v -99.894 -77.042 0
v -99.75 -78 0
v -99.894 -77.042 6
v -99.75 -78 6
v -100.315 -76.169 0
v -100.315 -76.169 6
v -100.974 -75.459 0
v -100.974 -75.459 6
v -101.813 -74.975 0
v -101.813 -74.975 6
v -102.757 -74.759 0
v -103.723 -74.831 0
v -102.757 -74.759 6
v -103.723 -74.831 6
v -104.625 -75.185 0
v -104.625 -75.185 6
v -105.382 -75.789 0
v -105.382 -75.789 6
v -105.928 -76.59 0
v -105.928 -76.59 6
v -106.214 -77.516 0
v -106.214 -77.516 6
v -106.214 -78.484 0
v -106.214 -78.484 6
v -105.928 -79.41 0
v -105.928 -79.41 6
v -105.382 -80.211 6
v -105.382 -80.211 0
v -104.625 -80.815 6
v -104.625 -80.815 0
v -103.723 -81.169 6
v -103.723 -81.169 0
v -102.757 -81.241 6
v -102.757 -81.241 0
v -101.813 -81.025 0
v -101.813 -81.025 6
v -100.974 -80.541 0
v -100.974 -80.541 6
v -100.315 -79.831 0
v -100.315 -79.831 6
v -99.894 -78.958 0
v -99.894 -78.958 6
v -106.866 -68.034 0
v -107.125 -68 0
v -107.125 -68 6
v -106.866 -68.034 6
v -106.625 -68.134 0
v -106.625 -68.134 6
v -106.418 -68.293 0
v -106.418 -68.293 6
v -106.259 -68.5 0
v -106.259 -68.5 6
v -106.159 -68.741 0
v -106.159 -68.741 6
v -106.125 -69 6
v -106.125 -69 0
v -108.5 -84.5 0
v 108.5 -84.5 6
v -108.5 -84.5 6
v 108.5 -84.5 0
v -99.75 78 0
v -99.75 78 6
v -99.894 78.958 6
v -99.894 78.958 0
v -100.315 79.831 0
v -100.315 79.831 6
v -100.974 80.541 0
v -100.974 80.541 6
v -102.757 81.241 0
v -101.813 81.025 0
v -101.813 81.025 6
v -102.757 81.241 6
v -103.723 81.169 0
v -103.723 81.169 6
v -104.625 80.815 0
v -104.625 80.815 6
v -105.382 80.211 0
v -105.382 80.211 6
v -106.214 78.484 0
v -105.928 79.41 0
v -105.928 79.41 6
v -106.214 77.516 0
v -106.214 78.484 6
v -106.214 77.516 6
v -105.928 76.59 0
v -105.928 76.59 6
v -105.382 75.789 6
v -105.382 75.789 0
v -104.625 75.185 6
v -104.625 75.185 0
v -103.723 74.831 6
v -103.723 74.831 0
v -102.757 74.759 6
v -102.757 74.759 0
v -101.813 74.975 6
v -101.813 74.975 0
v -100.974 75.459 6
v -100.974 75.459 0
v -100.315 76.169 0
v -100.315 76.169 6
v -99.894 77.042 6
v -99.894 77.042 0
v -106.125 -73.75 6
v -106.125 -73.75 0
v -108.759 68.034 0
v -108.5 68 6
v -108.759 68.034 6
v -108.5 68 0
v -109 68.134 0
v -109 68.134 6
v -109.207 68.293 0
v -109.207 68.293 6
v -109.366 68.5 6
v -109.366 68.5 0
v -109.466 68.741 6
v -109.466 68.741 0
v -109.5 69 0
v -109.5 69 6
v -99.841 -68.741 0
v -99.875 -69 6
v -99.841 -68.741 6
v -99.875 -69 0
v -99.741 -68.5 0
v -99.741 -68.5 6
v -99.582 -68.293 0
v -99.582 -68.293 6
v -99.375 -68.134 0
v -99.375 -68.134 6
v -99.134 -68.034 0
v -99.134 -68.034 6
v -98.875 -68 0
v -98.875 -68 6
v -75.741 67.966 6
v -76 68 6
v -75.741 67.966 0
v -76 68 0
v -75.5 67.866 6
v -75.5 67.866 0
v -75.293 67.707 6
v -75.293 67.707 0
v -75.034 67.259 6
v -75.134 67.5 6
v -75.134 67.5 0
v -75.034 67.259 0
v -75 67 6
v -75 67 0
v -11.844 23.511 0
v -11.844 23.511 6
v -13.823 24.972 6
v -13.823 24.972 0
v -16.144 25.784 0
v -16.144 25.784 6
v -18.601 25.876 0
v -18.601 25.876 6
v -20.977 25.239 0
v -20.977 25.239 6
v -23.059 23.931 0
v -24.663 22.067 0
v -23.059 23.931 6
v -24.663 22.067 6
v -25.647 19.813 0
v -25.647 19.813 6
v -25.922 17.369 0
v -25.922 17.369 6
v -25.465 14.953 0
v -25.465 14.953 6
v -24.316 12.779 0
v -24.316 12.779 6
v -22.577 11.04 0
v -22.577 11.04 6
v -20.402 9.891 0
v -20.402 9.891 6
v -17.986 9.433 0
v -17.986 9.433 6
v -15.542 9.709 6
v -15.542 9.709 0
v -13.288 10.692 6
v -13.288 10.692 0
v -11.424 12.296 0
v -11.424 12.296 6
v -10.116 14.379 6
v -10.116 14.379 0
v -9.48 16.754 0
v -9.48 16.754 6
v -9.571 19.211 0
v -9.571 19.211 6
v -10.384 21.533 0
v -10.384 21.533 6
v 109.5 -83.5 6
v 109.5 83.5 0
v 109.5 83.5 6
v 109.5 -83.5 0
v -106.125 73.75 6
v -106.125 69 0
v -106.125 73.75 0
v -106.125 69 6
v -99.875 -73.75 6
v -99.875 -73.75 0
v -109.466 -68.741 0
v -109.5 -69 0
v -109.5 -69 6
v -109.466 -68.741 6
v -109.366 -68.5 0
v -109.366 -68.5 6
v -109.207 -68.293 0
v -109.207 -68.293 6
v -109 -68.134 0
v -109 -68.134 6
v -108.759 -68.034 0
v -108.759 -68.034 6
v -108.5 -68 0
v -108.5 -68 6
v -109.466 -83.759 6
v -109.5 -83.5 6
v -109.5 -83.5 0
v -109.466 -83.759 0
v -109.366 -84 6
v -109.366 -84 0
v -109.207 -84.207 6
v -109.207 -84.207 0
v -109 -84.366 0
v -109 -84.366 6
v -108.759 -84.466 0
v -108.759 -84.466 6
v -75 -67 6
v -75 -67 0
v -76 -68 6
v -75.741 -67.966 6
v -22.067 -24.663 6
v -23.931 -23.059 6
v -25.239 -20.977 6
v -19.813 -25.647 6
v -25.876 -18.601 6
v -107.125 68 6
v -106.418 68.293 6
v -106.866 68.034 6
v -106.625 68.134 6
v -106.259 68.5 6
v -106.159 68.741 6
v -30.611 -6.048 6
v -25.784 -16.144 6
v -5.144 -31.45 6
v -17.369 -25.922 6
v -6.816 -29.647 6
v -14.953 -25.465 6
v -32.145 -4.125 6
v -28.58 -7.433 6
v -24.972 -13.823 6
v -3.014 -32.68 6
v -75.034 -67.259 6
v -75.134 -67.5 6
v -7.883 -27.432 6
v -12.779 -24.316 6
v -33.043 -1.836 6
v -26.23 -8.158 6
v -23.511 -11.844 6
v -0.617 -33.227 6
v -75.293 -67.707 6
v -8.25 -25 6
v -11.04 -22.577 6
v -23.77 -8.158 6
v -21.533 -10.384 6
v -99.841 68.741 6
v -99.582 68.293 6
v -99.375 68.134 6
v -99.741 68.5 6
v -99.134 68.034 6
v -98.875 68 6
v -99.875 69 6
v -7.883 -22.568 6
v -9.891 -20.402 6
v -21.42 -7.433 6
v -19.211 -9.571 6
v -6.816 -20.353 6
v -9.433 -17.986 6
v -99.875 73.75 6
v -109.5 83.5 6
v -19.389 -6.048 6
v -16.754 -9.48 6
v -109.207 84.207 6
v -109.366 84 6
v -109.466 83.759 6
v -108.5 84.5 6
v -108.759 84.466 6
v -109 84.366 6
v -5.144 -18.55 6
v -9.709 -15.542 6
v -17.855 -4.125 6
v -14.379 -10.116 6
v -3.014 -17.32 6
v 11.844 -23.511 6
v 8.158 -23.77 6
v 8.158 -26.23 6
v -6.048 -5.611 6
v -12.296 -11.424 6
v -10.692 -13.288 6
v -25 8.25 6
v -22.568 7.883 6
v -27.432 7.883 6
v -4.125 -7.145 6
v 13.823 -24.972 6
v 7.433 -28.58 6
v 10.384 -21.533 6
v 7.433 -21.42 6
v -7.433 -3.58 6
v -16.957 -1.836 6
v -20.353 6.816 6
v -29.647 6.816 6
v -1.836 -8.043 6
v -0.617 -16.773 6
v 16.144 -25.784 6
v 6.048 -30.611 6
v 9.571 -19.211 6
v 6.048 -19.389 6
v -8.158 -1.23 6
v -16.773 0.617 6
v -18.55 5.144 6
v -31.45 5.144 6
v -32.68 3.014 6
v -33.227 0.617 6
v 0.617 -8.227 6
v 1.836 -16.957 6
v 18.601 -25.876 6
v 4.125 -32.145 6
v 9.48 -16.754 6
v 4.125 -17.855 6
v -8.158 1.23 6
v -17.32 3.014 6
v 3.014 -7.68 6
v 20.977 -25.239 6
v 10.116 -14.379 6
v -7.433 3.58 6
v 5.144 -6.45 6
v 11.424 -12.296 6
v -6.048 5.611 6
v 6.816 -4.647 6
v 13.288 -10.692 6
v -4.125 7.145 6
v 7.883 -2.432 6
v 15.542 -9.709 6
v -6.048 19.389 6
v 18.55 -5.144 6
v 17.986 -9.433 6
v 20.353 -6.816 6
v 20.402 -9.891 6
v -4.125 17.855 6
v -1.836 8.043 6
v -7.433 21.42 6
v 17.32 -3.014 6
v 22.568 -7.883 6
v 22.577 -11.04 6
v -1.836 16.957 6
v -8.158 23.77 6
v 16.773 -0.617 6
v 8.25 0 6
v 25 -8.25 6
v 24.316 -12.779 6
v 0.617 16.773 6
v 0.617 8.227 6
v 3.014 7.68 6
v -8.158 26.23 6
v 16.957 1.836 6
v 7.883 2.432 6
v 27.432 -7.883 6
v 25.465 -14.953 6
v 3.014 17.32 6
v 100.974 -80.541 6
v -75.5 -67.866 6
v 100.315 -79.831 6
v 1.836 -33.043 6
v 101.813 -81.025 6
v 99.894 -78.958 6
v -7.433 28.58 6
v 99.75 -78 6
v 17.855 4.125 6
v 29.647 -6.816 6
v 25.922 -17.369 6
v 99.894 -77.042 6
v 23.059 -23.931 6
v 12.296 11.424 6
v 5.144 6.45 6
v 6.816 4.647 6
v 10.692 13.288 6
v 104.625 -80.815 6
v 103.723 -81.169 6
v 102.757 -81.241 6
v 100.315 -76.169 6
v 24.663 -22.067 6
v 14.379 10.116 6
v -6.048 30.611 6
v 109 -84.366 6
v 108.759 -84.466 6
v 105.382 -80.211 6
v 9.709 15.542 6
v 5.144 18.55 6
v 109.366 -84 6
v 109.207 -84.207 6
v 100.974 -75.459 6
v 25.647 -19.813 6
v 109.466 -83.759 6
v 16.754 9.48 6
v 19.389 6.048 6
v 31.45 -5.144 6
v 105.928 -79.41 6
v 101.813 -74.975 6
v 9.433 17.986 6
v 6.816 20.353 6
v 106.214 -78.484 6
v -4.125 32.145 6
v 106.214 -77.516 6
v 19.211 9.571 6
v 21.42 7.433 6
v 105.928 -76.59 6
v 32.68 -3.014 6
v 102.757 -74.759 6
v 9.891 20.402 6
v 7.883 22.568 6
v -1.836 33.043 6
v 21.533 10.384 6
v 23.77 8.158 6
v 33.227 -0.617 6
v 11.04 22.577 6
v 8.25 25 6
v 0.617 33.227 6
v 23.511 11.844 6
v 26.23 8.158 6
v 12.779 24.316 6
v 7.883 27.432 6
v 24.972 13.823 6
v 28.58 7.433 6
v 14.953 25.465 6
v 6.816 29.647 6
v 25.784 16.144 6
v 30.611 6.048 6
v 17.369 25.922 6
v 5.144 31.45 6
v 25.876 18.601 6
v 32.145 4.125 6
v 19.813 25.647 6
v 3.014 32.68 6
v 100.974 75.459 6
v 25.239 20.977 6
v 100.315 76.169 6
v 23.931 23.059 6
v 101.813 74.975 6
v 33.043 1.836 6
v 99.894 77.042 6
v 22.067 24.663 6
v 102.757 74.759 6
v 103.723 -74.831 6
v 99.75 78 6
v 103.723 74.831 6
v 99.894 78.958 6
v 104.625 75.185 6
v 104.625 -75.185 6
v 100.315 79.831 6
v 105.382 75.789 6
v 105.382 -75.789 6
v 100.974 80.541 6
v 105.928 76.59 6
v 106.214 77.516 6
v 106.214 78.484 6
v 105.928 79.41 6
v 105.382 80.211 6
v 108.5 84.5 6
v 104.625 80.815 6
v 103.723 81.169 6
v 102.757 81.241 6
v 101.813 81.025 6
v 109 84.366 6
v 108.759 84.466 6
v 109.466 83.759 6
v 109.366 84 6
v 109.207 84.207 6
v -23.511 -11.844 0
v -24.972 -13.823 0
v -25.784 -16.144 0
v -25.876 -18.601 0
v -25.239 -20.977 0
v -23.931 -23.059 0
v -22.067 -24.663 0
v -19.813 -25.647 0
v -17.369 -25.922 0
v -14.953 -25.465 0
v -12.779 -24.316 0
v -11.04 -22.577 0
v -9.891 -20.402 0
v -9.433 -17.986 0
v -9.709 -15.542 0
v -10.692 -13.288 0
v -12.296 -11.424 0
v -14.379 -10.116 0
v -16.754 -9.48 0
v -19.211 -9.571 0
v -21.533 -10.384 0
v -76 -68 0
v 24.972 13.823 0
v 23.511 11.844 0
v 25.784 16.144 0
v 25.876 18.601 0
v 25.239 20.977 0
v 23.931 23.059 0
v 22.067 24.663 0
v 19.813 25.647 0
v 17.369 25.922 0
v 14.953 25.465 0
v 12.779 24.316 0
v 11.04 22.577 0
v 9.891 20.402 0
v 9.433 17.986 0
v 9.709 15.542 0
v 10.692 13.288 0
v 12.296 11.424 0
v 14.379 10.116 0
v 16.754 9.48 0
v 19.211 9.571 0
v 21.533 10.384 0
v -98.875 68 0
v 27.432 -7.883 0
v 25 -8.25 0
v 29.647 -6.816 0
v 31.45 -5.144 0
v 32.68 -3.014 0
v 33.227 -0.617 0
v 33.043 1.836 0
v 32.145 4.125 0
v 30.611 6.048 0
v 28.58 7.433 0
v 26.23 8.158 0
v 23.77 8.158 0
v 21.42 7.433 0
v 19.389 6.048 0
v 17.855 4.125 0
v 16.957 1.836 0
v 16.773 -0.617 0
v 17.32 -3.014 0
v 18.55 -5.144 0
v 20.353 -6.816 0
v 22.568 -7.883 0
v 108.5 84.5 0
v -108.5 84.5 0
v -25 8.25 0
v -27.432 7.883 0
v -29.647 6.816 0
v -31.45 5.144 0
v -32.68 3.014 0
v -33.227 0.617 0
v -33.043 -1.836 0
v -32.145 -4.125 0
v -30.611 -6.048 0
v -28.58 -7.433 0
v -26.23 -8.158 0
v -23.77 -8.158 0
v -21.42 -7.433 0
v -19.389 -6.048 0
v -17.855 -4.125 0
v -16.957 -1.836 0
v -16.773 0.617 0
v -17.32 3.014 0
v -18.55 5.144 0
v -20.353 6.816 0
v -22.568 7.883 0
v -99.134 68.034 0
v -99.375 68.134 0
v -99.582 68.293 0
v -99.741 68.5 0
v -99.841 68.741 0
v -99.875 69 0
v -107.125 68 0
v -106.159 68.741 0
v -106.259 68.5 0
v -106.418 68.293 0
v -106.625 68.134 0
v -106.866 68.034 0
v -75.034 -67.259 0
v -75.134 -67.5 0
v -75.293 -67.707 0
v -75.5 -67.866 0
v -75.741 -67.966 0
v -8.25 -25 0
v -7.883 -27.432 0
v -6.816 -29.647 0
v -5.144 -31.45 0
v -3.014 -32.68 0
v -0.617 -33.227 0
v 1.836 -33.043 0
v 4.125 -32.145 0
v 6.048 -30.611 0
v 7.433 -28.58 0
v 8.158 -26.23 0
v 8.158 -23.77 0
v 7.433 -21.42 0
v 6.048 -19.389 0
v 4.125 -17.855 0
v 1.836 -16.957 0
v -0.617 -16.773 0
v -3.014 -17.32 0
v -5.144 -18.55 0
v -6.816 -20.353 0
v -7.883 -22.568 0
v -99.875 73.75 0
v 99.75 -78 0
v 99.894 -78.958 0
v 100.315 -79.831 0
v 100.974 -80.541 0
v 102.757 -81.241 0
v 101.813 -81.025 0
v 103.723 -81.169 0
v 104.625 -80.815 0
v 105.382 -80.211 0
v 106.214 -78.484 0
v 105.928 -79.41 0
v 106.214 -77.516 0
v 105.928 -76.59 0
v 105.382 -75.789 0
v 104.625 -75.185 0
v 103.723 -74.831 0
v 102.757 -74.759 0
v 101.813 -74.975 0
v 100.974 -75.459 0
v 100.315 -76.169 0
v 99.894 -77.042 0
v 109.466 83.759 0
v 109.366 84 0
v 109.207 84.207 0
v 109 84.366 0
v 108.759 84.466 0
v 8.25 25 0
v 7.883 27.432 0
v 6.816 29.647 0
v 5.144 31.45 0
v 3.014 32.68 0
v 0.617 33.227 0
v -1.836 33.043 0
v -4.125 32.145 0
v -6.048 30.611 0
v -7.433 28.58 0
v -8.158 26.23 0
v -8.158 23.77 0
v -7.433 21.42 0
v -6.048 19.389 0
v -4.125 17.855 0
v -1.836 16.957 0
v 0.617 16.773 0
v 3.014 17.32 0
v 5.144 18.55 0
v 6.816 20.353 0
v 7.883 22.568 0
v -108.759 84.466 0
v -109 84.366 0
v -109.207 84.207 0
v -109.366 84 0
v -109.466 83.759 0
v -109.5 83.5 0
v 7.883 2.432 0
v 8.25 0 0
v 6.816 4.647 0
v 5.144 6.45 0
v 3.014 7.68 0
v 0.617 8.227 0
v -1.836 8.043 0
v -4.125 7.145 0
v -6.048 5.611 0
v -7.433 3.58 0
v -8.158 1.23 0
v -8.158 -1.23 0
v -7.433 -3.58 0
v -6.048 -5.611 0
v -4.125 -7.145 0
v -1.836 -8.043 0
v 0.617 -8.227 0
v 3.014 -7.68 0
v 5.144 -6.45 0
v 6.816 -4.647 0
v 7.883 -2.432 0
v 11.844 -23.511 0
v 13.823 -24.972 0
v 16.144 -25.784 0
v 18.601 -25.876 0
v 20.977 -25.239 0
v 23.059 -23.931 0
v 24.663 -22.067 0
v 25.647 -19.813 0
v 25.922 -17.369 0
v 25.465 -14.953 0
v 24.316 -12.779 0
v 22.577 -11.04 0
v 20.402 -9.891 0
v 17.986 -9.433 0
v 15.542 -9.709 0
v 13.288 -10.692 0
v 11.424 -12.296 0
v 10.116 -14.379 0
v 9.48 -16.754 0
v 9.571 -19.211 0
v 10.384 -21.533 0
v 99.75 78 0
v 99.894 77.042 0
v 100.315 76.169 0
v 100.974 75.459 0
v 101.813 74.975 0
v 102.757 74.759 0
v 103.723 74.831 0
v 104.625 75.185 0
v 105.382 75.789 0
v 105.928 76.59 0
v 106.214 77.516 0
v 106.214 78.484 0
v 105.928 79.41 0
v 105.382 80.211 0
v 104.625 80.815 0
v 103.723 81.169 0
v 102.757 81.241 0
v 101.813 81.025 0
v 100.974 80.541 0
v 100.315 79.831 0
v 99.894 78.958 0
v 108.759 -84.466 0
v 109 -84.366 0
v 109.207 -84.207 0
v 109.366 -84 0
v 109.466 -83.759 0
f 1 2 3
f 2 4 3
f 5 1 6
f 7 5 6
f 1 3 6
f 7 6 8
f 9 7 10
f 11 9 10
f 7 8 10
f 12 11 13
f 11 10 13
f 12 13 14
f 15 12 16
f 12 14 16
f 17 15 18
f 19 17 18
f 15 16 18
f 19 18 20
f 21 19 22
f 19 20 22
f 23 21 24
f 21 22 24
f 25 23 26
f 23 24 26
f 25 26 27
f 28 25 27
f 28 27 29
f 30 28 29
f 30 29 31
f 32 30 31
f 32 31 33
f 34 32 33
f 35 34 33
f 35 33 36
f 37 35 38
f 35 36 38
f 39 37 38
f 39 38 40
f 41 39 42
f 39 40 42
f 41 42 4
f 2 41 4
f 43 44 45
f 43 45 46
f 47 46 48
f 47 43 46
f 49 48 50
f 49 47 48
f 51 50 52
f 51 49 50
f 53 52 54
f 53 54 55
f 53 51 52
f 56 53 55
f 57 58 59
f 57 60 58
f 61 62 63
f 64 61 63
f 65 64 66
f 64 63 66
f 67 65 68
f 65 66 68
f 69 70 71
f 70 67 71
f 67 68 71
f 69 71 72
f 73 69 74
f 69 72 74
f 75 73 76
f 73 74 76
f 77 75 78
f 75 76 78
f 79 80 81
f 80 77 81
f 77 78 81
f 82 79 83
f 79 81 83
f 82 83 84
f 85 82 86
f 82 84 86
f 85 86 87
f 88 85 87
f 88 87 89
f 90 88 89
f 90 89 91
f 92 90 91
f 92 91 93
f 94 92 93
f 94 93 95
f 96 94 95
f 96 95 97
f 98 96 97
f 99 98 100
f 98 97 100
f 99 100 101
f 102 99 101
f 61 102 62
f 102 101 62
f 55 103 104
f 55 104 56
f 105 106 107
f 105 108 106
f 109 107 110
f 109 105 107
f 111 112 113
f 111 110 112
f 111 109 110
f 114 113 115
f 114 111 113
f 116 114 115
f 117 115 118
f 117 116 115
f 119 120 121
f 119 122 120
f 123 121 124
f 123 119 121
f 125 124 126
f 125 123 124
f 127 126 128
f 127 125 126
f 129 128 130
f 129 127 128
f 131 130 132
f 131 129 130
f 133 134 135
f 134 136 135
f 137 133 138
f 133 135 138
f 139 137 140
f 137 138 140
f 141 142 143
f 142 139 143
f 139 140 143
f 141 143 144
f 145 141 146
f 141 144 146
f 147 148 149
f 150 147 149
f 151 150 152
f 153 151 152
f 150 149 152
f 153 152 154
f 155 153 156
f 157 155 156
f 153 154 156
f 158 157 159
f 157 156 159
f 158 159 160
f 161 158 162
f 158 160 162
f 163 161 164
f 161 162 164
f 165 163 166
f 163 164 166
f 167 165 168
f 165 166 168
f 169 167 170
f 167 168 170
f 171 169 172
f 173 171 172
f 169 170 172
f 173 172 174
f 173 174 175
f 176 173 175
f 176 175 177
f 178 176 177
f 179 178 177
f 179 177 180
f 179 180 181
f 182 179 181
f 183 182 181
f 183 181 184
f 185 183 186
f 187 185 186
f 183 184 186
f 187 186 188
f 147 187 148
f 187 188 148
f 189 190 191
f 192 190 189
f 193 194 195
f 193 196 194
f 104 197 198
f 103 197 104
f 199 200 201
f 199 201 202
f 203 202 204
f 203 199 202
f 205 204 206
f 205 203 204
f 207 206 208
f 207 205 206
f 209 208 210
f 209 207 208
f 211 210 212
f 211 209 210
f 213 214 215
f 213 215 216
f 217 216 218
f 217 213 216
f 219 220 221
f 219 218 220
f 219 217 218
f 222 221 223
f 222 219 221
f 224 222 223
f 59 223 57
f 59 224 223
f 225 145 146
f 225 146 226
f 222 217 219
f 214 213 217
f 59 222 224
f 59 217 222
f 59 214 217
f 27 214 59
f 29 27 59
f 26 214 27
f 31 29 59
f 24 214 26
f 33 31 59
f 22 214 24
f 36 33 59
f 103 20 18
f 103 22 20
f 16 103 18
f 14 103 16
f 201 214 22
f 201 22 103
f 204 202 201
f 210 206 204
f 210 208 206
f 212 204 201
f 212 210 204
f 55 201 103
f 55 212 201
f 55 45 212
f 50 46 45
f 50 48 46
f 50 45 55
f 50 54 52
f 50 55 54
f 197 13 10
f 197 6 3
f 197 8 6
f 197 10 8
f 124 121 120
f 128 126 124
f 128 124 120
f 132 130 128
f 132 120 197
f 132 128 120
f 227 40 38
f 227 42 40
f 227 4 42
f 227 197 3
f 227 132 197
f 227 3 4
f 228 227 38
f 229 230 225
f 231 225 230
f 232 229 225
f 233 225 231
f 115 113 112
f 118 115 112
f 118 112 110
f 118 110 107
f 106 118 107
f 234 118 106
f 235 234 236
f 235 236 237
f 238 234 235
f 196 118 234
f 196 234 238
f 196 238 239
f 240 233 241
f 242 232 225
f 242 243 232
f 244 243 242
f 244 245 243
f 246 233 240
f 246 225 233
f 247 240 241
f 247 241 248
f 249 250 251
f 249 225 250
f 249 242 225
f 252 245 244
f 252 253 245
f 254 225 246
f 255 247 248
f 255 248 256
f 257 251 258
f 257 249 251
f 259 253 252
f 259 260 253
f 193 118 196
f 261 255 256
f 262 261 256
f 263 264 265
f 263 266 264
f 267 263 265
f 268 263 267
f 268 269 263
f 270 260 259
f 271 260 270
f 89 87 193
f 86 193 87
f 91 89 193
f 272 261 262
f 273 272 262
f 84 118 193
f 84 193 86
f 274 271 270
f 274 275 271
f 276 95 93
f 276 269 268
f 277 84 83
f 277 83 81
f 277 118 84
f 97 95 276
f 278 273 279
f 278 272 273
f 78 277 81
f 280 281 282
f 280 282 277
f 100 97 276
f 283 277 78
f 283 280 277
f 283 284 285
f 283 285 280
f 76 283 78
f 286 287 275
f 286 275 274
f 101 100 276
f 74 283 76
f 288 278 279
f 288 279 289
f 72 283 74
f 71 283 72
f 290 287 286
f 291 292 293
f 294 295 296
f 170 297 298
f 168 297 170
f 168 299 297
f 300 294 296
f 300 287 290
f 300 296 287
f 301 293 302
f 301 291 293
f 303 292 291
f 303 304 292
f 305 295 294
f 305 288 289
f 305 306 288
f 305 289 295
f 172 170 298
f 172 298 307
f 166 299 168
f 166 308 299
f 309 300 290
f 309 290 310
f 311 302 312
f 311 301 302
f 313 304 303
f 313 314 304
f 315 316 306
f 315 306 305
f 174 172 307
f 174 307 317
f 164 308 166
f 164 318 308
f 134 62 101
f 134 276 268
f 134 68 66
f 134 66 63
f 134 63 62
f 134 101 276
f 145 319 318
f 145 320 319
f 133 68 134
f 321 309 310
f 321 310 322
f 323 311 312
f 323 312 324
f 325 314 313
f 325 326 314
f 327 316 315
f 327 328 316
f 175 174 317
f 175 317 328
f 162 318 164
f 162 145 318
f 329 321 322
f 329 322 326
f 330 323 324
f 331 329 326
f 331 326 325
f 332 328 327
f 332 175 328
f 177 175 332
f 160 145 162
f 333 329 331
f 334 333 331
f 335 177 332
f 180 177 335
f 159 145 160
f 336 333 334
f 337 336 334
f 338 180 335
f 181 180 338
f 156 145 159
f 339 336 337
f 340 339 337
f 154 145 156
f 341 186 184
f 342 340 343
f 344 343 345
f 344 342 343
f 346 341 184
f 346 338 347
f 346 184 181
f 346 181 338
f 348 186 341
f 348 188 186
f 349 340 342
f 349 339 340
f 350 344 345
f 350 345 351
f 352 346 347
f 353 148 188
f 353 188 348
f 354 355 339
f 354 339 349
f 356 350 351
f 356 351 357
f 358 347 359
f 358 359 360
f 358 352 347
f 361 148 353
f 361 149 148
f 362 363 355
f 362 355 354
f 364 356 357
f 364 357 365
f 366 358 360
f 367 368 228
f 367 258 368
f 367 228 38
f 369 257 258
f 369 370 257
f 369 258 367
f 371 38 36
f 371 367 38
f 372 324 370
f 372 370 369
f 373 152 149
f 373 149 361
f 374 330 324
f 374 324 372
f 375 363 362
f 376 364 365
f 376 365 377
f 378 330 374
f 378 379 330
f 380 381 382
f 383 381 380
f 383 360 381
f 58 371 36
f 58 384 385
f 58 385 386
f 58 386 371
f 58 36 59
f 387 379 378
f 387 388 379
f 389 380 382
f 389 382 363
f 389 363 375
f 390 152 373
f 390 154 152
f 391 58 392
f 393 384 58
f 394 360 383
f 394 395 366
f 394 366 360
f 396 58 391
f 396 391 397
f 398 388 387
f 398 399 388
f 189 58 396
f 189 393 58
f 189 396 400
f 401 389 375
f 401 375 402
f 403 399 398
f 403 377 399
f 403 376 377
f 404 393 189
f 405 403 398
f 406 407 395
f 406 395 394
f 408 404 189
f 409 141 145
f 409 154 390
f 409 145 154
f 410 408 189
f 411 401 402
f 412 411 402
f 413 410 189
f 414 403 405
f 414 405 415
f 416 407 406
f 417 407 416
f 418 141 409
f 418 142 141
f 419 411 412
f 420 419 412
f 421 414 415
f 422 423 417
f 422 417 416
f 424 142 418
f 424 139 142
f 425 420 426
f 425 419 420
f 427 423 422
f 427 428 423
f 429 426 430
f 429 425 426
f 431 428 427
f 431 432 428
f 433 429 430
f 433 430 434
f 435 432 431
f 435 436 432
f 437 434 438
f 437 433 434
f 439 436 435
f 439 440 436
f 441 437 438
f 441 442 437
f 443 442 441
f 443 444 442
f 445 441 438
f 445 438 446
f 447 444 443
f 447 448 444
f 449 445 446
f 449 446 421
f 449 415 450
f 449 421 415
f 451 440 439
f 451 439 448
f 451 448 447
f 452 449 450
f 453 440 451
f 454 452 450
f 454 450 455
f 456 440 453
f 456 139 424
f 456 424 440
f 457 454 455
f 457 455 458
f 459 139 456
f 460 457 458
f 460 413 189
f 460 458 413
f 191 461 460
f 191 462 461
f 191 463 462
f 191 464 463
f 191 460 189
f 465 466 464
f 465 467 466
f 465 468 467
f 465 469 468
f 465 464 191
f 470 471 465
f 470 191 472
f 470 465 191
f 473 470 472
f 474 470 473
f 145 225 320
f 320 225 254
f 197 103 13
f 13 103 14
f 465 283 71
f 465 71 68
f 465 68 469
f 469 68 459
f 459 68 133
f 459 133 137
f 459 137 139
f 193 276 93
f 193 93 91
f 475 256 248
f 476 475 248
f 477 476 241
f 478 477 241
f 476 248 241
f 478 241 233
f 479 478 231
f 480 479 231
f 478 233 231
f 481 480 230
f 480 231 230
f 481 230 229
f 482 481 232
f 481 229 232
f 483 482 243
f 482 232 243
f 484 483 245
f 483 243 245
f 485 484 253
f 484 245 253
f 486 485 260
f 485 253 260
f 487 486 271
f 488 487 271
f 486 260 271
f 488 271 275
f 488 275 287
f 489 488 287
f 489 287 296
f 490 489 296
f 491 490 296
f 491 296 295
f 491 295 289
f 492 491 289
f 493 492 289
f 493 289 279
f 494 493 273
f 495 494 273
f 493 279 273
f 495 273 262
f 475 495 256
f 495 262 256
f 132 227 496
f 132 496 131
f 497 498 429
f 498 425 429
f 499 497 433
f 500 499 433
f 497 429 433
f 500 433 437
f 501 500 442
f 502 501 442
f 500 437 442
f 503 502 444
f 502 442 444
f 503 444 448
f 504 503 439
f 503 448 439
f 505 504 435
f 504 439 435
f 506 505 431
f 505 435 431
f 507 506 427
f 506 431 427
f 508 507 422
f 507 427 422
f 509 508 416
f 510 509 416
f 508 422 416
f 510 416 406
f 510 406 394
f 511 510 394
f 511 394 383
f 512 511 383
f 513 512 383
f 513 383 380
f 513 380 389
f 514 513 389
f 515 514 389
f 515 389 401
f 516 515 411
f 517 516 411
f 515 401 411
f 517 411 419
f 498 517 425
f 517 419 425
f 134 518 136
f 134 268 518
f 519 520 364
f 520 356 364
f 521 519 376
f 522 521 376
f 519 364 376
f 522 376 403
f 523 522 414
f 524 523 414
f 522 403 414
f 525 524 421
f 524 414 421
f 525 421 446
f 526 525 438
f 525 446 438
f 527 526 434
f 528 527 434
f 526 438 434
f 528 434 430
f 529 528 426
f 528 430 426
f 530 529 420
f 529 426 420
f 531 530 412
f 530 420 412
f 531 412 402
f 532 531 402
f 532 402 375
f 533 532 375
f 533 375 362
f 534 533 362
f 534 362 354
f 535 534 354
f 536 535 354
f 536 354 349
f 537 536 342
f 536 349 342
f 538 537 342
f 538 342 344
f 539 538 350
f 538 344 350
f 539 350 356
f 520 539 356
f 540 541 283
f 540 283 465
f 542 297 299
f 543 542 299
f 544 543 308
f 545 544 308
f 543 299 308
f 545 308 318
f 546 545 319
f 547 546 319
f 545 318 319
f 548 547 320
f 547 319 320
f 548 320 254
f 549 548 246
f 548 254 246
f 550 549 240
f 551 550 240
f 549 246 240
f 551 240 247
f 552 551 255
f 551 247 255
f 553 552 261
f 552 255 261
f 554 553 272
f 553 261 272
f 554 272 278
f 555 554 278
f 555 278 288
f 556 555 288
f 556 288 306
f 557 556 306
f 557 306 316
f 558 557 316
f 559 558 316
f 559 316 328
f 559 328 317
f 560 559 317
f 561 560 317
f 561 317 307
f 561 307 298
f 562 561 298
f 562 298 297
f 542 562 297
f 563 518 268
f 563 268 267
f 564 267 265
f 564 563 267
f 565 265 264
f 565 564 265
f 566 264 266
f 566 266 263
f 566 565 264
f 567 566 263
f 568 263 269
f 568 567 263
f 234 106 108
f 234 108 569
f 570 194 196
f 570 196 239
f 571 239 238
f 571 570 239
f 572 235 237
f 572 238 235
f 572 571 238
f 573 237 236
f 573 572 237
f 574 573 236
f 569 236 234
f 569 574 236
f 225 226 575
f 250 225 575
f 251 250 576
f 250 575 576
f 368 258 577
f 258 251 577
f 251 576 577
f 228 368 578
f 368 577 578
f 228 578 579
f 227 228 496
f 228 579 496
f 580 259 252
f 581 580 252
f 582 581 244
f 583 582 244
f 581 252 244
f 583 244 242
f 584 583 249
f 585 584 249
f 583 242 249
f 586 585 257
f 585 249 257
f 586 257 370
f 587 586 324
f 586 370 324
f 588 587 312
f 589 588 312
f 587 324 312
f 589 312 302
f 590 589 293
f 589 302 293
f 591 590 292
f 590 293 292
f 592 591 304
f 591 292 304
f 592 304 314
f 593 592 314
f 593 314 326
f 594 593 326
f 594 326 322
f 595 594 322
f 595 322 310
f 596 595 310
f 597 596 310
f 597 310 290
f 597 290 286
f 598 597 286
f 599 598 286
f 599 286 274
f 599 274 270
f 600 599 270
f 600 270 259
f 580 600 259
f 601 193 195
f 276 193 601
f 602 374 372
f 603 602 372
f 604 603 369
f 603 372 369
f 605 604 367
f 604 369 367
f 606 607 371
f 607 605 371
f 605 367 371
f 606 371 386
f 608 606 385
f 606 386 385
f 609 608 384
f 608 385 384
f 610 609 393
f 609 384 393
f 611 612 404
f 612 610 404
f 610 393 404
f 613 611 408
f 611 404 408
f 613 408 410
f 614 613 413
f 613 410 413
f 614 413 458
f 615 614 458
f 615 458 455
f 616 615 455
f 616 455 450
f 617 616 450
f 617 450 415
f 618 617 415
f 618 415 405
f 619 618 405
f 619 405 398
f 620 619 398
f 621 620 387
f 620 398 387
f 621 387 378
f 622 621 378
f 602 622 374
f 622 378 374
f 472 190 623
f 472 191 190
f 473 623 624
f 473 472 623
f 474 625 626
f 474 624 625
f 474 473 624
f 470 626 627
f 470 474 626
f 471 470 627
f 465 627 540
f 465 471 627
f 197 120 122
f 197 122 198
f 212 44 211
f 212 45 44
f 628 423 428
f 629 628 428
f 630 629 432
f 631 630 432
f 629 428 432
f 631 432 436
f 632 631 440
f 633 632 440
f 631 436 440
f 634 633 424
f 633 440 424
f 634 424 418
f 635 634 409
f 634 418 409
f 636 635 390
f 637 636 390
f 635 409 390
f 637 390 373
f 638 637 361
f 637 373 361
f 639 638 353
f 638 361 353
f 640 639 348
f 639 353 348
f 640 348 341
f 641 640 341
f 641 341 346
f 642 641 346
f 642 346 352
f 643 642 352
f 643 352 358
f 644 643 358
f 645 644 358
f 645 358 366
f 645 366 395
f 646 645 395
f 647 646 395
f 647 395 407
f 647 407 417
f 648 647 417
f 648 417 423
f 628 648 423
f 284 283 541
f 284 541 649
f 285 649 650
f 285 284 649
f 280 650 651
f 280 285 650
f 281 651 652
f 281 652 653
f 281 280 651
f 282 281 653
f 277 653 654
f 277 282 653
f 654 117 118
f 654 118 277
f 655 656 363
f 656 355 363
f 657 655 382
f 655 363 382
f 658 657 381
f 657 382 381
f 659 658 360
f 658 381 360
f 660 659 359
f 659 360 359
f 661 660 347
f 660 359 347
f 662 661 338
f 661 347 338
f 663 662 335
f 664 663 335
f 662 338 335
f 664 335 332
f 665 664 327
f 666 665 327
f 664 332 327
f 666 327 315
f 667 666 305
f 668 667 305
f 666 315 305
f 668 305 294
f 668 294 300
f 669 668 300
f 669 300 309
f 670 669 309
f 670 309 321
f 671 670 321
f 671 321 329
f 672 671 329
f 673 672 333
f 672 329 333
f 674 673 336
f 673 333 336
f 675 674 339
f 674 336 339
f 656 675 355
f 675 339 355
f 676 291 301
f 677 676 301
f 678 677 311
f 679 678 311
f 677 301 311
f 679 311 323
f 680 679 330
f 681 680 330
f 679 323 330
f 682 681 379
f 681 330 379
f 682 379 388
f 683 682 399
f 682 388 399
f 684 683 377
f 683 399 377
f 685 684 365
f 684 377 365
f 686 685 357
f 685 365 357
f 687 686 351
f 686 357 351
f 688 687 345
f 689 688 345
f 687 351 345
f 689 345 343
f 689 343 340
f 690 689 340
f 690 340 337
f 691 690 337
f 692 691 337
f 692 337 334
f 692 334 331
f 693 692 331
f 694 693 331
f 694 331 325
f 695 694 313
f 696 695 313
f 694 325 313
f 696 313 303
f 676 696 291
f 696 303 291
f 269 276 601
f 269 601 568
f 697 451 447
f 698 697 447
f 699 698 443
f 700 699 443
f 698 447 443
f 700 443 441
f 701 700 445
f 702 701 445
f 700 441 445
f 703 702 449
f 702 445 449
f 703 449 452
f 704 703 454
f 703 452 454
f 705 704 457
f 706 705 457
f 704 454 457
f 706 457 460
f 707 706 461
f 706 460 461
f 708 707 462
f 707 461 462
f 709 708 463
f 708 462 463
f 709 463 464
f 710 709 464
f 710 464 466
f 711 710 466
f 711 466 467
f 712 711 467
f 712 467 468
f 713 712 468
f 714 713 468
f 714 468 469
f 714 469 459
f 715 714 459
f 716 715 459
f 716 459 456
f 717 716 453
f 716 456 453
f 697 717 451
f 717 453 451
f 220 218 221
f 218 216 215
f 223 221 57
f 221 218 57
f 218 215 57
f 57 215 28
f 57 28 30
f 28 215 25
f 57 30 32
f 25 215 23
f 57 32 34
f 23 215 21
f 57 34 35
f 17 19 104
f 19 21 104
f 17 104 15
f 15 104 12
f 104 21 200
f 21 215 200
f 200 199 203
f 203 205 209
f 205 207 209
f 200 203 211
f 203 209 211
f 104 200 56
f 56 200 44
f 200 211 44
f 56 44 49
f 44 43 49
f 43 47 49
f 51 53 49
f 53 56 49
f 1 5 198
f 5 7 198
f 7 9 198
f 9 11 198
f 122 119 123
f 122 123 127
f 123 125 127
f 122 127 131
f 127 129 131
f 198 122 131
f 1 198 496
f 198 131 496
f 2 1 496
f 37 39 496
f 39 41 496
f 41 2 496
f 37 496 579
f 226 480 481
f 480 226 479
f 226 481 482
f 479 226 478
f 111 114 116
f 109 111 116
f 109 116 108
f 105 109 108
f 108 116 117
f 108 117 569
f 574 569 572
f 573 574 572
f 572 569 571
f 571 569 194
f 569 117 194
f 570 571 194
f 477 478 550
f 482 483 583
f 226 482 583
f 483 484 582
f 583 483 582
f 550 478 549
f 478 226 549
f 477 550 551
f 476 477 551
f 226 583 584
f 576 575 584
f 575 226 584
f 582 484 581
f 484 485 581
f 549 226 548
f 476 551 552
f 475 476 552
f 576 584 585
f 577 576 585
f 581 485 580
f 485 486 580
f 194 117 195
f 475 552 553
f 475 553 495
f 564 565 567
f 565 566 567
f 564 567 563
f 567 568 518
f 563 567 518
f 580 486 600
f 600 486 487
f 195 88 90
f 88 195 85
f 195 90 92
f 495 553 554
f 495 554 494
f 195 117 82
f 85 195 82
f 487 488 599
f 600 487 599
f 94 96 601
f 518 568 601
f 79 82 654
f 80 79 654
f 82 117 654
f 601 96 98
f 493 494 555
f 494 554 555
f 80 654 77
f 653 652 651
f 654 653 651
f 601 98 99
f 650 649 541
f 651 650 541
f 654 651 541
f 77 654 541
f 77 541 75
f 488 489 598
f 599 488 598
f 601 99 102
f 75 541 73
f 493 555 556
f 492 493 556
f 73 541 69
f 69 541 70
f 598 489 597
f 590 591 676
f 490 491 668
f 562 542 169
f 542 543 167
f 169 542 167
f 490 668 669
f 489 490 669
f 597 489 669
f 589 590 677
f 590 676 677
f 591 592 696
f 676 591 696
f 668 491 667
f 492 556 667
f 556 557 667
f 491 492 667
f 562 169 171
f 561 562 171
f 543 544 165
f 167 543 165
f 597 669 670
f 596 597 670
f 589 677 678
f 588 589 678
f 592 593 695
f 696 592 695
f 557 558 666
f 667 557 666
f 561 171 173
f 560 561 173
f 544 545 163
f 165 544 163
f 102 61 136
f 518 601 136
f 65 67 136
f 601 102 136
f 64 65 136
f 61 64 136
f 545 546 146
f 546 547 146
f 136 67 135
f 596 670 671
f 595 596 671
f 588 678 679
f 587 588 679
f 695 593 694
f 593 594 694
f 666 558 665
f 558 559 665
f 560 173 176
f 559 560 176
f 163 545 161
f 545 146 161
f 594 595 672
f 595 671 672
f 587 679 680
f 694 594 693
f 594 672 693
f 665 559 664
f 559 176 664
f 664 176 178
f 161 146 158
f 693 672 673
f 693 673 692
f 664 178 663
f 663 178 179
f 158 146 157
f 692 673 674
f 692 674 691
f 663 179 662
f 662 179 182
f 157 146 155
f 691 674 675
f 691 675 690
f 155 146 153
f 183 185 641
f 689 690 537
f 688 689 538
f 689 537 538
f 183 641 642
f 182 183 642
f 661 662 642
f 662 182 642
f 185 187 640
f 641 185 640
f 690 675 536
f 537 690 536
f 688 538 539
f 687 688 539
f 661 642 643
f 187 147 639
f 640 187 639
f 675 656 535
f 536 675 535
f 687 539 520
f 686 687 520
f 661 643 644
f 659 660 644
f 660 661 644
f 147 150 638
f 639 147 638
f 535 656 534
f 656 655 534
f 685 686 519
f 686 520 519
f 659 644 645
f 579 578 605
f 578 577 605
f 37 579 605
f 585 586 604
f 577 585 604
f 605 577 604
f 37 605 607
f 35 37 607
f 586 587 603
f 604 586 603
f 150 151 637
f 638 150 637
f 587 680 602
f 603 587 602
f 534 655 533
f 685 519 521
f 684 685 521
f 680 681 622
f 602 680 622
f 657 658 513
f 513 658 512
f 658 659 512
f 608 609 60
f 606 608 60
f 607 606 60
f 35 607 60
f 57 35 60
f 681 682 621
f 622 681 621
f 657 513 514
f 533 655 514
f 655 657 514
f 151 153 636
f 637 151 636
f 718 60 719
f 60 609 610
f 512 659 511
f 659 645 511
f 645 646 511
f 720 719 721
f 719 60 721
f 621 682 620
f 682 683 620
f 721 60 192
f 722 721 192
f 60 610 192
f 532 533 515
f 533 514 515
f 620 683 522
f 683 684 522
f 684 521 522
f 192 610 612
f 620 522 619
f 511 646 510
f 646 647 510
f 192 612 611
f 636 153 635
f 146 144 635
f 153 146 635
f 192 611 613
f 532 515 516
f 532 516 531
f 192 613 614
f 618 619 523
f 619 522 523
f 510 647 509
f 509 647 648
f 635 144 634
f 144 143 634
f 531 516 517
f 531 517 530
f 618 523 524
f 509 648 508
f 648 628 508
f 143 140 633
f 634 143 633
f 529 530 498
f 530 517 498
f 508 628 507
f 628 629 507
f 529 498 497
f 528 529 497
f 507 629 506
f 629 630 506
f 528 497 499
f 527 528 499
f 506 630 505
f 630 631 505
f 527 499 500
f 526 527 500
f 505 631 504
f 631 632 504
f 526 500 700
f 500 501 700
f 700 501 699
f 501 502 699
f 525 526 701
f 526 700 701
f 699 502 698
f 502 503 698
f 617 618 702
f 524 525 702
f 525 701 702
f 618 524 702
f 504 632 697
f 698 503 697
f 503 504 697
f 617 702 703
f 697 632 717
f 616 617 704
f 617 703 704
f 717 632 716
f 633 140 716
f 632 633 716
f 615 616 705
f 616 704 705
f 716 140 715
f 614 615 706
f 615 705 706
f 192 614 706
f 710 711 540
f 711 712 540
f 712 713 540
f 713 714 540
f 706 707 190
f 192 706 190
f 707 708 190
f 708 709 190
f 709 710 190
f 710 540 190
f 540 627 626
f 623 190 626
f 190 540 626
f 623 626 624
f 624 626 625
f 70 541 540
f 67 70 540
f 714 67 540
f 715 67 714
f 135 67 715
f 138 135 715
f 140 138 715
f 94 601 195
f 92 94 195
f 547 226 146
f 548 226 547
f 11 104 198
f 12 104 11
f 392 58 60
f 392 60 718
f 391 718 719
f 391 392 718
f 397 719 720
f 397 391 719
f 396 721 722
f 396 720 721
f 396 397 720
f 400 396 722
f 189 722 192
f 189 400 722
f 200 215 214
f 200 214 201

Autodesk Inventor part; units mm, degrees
sketch "Sketch1" plane through (0, 0, 0) normal (0, 0, 1) x (1, 0, 0)
  line L0 (-109.5, 84.5) -> (109.5, 84.5)
  line L1 (109.5, 84.5) -> (109.5, -84.5)
  line L2 (109.5, -84.5) -> (-109.5, -84.5)
  line L3 (-109.5, -84.5) -> (-109.5, 84.5)
  point P0 (0, 84.5)
  point P1 (0, 0)
  point P2 (-109.5, 0)
  dimension "d0" = 219
  dimension "d1" = 169
extrude "Extrusion1" add sketch "Sketch1" along normal blind 6
sketch "Sketch2" plane through (0, 0, 6) normal (0, 0, 1) x (1, 0, 0)
  circle A0 centre (-103, -78) radius 3.25
  line L0 (-103, -78) -> (-103, -74) construction
  line L1 (-106.25, -68) -> (-99.75, -68)
  line L2 (-99.75, -68) -> (-99.75, -74)
  line L3 (-99.75, -74) -> (-106.25, -74)
  line L4 (-106.25, -74) -> (-106.25, -68)
  line L5 (-109.5, -84.5) -> (109.5, -84.5) projected
  line L6 (-109.5, -84.5) -> (-103, -84.5) construction
  line L7 (-103, -84.5) -> (-103, -78) construction
  point P0 (0, 0)
  dimension "d39" = 6.5
  dimension "d44" = 4
  dimension "d45" = 6.5
  dimension "d46" = 6
  dimension "d64" = 6.5
  dimension "d65" = 6.5
extrude "Extrusion2" cut sketch "Sketch2" against normal blind 6 contours A0
mirror "Mirror3" about plane through (0, 0, 0) normal (1, 0, 0) of "Extrusion2"
mirror "Mirror7" about plane through (0, 0, 0) normal (0, 1, 0) of "Extrusion2", "Mirror3"
sketch "Sketch7" plane through (0, 0, 6) normal (0, 0, 1) x (1, 0, 0)
  line L0 (-109.5, 84.5) -> (-109.5, -84.5) projected
  line L1 (-109.5, 68) -> (-75, 68)
  line L2 (-75, 68) -> (-75, -68)
  line L3 (-75, -68) -> (-109.5, -68)
  line L4 (-109.5, -68) -> (-109.5, 68)
  point P0 (0, 0)
  point P1 (-109.5, 0)
  point P2 (-109.5, 0)
  dimension "d40" = 34.5
  dimension "d41" = 136
extrude "Extrusion6" cut sketch "Sketch7" against normal blind 10
sketch "Sketch8" plane through (0, 0, 6) normal (0, 0, 1) x (1, 0, 0)
  circle A0 centre (-103, -78) radius 3.25 projected
  line L0 (-103, -78) -> (-103, -73.75) construction
  line L1 (-106.125, -68) -> (-99.875, -68)
  line L2 (-99.875, -68) -> (-99.875, -73.75)
  line L3 (-99.875, -73.75) -> (-106.125, -73.75)
  line L4 (-106.125, -73.75) -> (-106.125, -68)
  point P0 (0, 0)
  dimension "d47" = 4.25
  dimension "d48" = 6.25
  dimension "d49" = 5.75
extrude "Extrusion7" cut sketch "Sketch8" against normal blind 6 contours L1 L2 L3 L4
mirror "Mirror8" about plane through (0, 0, 0) normal (0, 1, 0) of "Extrusion7"
fillet "Fillet5" radius 1 12 edges at (-109.5, -84.5, 3) (109.5, -84.5, 3) (-75, -68, 3) (109.5, 84.5, 3) (-109.5, 84.5, 3) (-109.5, 68, 3) (-75, 68, 3) (-99.875, 68, 3) (-106.125, 68, 3) (-99.875, -68, 3) (-109.5, -68, 3) (-106.125, -68, 3)
sketch "Sketch10" plane through (0, 0, 6) normal (0, 0, 1) x (1, 0, 0)
  line L0 (-75, 44.5) -> (39, 44.5) construction
  line L1 (39, 44.5) -> (39, -44.5) construction
  line L2 (39, -44.5) -> (-75, -44.5) construction
  line L3 (-75, -44.5) -> (-75, 44.5) construction
  line L4 (-75, 67) -> (-75, -67) projected
  line L5 (-75, 44.5) -> (39, -44.5) construction
  circle A0 centre (0, 0) radius 8.25
  line L6 (0, 0) -> (0, 25) construction
  circle A1 centre (0, 25) radius 8.25
  point P0 (-75, 0)
  point P1 (-75, 0)
  point P2 (-75, 0)
  dimension "d53" = 114
  dimension "d54" = 89
  dimension "d55" = 16.5
  dimension "d56" = 25
  dimension "d57" = 16.5
extrude "Extrusion8" cut sketch "Sketch10" against normal through all
pattern_circular "Circular Pattern1" count 8 over 360 about axis through (0, 0, 6) along (0, 0, -1) of "Extrusion8"
equation "\"d7\" = d46"
properties part number "MDF_Top_Big_Mic" material "MDF Medium Density Fiberboard"
